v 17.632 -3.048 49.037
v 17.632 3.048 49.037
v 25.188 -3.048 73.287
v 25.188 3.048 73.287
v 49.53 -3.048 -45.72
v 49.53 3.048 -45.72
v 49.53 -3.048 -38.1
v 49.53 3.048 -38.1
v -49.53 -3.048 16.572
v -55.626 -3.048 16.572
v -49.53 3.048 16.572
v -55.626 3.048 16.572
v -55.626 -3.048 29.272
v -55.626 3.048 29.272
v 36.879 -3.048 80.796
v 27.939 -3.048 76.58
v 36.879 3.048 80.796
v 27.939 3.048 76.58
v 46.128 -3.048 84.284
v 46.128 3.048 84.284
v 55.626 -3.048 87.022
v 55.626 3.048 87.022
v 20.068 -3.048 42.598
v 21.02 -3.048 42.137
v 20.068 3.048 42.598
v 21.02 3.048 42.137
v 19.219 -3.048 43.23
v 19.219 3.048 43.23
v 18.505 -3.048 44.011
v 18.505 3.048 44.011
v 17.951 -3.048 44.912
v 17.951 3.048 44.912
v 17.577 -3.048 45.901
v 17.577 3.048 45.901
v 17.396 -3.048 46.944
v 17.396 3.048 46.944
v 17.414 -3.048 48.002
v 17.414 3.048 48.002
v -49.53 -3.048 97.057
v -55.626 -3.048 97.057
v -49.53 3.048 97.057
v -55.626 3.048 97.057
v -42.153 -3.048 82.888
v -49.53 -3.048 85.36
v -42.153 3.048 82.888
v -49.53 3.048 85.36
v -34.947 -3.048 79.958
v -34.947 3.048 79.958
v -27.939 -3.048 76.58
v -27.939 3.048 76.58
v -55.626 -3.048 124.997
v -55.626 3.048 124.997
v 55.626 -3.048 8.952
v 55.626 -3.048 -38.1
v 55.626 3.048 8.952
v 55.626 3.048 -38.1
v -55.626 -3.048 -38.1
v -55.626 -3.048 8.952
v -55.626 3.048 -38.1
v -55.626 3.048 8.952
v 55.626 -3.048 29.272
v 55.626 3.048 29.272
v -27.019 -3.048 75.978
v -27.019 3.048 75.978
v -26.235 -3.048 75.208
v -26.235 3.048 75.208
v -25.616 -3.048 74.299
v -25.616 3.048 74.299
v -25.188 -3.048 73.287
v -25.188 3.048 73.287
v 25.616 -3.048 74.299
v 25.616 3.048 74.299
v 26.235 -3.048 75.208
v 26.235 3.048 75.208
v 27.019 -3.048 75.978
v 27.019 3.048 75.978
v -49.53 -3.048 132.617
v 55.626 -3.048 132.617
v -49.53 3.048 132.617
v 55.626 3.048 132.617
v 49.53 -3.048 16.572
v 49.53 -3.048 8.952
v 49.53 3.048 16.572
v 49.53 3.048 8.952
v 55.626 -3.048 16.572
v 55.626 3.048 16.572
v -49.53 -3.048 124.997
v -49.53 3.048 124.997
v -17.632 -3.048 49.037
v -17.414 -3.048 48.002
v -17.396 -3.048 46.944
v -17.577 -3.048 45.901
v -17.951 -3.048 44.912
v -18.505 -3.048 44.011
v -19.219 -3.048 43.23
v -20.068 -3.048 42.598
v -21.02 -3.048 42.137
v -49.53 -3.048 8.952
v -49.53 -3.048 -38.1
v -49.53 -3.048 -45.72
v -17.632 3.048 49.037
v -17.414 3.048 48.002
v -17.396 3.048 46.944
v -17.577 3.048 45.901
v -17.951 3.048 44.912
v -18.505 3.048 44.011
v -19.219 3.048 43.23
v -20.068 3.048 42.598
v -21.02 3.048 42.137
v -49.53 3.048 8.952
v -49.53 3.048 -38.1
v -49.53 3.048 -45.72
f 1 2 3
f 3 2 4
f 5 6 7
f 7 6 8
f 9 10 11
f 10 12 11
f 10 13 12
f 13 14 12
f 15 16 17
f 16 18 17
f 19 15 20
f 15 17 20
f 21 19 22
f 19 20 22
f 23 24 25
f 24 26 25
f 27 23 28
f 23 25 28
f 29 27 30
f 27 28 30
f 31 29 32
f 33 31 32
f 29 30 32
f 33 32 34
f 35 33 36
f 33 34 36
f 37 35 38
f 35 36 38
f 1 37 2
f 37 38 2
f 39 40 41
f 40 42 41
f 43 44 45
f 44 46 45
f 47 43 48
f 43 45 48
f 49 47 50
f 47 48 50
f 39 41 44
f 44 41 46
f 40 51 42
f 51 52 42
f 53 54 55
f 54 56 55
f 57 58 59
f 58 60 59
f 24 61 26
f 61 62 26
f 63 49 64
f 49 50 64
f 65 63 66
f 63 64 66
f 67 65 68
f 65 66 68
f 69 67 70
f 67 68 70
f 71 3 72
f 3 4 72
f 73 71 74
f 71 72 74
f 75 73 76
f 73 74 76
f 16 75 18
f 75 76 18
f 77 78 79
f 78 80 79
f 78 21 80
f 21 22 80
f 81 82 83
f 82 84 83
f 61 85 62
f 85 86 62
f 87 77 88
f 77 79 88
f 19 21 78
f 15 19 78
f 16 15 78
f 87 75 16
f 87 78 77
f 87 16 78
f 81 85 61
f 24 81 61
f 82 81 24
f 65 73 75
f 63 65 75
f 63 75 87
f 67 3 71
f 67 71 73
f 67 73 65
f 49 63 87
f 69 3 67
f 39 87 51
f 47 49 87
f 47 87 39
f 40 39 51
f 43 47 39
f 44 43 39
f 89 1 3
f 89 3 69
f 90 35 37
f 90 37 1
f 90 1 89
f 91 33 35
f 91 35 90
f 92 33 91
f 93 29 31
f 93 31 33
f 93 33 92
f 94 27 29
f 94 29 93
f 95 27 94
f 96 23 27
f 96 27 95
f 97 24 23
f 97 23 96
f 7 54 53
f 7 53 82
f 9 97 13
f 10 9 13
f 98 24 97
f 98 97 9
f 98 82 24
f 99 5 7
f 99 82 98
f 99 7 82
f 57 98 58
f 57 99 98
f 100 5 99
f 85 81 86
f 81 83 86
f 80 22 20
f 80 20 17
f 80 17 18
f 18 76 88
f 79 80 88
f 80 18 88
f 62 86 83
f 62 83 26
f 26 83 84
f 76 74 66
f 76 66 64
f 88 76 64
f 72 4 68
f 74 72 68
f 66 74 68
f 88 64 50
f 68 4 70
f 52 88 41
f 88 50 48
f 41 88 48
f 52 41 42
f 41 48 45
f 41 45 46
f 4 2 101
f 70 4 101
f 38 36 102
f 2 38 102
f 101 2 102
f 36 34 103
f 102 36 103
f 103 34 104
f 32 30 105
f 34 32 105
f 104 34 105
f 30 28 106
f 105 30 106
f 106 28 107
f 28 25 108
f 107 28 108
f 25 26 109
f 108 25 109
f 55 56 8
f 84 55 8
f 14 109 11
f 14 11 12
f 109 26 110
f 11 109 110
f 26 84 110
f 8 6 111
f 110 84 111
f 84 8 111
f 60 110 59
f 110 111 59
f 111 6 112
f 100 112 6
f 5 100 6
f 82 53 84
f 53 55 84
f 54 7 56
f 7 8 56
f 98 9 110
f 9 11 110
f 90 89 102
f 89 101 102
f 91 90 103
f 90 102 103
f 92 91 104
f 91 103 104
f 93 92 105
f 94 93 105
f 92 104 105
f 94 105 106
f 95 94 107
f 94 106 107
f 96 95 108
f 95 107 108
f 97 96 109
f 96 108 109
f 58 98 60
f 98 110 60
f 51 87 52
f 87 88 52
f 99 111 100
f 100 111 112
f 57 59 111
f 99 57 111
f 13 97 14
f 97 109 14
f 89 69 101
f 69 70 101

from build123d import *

# Parameters (mm, degrees)
BOSS_EXTRUDE1_DEPTH = 3.048


with BuildPart() as part:
    # Sketch1 → Boss-Extrude1 (new, symmetric)
    with BuildSketch(Plane(origin=(0, 0, 0), x_dir=(1, 0, 0), z_dir=(0, 1, 0))):
        with BuildLine():
            Line((-49.53, 45.72), (49.53, 45.72))
            Line((49.53, 45.72), (49.53, 38.1))
            Line((49.53, 38.1), (55.626, 38.1))
            Line((55.626, 38.1), (55.626, -8.951856626))
            Line((55.626, -8.951856626), (49.53, -8.951856626))
            Line((49.53, -8.951856626), (49.53, -16.571856626))
            Line((49.53, -16.571856626), (55.626, -16.571856626))
            Line((55.626, -16.571856626), (55.626, -29.271856626))
            Line((55.626, -29.271856626), (21.019827136, -42.136821893))
            ThreePointArc((21.019827136, -42.136821893), (17.95098831, -44.911778638), (17.631953735, -49.036869377))
            Line((17.631953735, -49.036869377), (25.187729856, -73.287029113))
            ThreePointArc((25.187729856, -73.287029113), (26.234780075, -75.207903536), (27.939063878, -76.579577488))
            ThreePointArc((27.939063878, -76.579577488), (41.468907088, -82.632484358), (55.626, -87.022365809))
            Line((55.626, -87.022365809), (55.626, -132.617292876))
            Line((55.626, -132.617292876), (-49.53, -132.617292876))
            Line((-49.53, -132.617292876), (-49.53, -124.997292876))
            Line((-49.53, -124.997292876), (-55.626, -124.997292876))
            Line((-55.626, -124.997292876), (-55.626, -97.057292876))
            Line((-55.626, -97.057292876), (-49.53, -97.057292876))
            Line((-49.53, -97.057292876), (-49.53, -85.359826344))
            ThreePointArc((-49.53, -85.359826344), (-38.527111219, -81.479756652), (-27.939063878, -76.579577488))
            ThreePointArc((-27.939063878, -76.579577488), (-26.234780075, -75.207903536), (-25.187729856, -73.287029113))
            Line((-25.187729856, -73.287029113), (-17.631953735, -49.036869377))
            ThreePointArc((-17.631953735, -49.036869377), (-17.95098831, -44.911778638), (-21.019827136, -42.136821893))
            Line((-21.019827136, -42.136821893), (-55.626, -29.271856626))
            Line((-55.626, -29.271856626), (-55.626, -16.571856626))
            Line((-55.626, -16.571856626), (-49.53, -16.571856626))
            Line((-49.53, -16.571856626), (-49.53, -8.951856626))
            Line((-49.53, -8.951856626), (-55.626, -8.951856626))
            Line((-55.626, -8.951856626), (-55.626, 38.1))
            Line((-55.626, 38.1), (-49.53, 38.1))
            Line((-49.53, 38.1), (-49.53, 45.72))
        make_face()
    extrude(amount=BOSS_EXTRUDE1_DEPTH, both=True)


solid = part.part
